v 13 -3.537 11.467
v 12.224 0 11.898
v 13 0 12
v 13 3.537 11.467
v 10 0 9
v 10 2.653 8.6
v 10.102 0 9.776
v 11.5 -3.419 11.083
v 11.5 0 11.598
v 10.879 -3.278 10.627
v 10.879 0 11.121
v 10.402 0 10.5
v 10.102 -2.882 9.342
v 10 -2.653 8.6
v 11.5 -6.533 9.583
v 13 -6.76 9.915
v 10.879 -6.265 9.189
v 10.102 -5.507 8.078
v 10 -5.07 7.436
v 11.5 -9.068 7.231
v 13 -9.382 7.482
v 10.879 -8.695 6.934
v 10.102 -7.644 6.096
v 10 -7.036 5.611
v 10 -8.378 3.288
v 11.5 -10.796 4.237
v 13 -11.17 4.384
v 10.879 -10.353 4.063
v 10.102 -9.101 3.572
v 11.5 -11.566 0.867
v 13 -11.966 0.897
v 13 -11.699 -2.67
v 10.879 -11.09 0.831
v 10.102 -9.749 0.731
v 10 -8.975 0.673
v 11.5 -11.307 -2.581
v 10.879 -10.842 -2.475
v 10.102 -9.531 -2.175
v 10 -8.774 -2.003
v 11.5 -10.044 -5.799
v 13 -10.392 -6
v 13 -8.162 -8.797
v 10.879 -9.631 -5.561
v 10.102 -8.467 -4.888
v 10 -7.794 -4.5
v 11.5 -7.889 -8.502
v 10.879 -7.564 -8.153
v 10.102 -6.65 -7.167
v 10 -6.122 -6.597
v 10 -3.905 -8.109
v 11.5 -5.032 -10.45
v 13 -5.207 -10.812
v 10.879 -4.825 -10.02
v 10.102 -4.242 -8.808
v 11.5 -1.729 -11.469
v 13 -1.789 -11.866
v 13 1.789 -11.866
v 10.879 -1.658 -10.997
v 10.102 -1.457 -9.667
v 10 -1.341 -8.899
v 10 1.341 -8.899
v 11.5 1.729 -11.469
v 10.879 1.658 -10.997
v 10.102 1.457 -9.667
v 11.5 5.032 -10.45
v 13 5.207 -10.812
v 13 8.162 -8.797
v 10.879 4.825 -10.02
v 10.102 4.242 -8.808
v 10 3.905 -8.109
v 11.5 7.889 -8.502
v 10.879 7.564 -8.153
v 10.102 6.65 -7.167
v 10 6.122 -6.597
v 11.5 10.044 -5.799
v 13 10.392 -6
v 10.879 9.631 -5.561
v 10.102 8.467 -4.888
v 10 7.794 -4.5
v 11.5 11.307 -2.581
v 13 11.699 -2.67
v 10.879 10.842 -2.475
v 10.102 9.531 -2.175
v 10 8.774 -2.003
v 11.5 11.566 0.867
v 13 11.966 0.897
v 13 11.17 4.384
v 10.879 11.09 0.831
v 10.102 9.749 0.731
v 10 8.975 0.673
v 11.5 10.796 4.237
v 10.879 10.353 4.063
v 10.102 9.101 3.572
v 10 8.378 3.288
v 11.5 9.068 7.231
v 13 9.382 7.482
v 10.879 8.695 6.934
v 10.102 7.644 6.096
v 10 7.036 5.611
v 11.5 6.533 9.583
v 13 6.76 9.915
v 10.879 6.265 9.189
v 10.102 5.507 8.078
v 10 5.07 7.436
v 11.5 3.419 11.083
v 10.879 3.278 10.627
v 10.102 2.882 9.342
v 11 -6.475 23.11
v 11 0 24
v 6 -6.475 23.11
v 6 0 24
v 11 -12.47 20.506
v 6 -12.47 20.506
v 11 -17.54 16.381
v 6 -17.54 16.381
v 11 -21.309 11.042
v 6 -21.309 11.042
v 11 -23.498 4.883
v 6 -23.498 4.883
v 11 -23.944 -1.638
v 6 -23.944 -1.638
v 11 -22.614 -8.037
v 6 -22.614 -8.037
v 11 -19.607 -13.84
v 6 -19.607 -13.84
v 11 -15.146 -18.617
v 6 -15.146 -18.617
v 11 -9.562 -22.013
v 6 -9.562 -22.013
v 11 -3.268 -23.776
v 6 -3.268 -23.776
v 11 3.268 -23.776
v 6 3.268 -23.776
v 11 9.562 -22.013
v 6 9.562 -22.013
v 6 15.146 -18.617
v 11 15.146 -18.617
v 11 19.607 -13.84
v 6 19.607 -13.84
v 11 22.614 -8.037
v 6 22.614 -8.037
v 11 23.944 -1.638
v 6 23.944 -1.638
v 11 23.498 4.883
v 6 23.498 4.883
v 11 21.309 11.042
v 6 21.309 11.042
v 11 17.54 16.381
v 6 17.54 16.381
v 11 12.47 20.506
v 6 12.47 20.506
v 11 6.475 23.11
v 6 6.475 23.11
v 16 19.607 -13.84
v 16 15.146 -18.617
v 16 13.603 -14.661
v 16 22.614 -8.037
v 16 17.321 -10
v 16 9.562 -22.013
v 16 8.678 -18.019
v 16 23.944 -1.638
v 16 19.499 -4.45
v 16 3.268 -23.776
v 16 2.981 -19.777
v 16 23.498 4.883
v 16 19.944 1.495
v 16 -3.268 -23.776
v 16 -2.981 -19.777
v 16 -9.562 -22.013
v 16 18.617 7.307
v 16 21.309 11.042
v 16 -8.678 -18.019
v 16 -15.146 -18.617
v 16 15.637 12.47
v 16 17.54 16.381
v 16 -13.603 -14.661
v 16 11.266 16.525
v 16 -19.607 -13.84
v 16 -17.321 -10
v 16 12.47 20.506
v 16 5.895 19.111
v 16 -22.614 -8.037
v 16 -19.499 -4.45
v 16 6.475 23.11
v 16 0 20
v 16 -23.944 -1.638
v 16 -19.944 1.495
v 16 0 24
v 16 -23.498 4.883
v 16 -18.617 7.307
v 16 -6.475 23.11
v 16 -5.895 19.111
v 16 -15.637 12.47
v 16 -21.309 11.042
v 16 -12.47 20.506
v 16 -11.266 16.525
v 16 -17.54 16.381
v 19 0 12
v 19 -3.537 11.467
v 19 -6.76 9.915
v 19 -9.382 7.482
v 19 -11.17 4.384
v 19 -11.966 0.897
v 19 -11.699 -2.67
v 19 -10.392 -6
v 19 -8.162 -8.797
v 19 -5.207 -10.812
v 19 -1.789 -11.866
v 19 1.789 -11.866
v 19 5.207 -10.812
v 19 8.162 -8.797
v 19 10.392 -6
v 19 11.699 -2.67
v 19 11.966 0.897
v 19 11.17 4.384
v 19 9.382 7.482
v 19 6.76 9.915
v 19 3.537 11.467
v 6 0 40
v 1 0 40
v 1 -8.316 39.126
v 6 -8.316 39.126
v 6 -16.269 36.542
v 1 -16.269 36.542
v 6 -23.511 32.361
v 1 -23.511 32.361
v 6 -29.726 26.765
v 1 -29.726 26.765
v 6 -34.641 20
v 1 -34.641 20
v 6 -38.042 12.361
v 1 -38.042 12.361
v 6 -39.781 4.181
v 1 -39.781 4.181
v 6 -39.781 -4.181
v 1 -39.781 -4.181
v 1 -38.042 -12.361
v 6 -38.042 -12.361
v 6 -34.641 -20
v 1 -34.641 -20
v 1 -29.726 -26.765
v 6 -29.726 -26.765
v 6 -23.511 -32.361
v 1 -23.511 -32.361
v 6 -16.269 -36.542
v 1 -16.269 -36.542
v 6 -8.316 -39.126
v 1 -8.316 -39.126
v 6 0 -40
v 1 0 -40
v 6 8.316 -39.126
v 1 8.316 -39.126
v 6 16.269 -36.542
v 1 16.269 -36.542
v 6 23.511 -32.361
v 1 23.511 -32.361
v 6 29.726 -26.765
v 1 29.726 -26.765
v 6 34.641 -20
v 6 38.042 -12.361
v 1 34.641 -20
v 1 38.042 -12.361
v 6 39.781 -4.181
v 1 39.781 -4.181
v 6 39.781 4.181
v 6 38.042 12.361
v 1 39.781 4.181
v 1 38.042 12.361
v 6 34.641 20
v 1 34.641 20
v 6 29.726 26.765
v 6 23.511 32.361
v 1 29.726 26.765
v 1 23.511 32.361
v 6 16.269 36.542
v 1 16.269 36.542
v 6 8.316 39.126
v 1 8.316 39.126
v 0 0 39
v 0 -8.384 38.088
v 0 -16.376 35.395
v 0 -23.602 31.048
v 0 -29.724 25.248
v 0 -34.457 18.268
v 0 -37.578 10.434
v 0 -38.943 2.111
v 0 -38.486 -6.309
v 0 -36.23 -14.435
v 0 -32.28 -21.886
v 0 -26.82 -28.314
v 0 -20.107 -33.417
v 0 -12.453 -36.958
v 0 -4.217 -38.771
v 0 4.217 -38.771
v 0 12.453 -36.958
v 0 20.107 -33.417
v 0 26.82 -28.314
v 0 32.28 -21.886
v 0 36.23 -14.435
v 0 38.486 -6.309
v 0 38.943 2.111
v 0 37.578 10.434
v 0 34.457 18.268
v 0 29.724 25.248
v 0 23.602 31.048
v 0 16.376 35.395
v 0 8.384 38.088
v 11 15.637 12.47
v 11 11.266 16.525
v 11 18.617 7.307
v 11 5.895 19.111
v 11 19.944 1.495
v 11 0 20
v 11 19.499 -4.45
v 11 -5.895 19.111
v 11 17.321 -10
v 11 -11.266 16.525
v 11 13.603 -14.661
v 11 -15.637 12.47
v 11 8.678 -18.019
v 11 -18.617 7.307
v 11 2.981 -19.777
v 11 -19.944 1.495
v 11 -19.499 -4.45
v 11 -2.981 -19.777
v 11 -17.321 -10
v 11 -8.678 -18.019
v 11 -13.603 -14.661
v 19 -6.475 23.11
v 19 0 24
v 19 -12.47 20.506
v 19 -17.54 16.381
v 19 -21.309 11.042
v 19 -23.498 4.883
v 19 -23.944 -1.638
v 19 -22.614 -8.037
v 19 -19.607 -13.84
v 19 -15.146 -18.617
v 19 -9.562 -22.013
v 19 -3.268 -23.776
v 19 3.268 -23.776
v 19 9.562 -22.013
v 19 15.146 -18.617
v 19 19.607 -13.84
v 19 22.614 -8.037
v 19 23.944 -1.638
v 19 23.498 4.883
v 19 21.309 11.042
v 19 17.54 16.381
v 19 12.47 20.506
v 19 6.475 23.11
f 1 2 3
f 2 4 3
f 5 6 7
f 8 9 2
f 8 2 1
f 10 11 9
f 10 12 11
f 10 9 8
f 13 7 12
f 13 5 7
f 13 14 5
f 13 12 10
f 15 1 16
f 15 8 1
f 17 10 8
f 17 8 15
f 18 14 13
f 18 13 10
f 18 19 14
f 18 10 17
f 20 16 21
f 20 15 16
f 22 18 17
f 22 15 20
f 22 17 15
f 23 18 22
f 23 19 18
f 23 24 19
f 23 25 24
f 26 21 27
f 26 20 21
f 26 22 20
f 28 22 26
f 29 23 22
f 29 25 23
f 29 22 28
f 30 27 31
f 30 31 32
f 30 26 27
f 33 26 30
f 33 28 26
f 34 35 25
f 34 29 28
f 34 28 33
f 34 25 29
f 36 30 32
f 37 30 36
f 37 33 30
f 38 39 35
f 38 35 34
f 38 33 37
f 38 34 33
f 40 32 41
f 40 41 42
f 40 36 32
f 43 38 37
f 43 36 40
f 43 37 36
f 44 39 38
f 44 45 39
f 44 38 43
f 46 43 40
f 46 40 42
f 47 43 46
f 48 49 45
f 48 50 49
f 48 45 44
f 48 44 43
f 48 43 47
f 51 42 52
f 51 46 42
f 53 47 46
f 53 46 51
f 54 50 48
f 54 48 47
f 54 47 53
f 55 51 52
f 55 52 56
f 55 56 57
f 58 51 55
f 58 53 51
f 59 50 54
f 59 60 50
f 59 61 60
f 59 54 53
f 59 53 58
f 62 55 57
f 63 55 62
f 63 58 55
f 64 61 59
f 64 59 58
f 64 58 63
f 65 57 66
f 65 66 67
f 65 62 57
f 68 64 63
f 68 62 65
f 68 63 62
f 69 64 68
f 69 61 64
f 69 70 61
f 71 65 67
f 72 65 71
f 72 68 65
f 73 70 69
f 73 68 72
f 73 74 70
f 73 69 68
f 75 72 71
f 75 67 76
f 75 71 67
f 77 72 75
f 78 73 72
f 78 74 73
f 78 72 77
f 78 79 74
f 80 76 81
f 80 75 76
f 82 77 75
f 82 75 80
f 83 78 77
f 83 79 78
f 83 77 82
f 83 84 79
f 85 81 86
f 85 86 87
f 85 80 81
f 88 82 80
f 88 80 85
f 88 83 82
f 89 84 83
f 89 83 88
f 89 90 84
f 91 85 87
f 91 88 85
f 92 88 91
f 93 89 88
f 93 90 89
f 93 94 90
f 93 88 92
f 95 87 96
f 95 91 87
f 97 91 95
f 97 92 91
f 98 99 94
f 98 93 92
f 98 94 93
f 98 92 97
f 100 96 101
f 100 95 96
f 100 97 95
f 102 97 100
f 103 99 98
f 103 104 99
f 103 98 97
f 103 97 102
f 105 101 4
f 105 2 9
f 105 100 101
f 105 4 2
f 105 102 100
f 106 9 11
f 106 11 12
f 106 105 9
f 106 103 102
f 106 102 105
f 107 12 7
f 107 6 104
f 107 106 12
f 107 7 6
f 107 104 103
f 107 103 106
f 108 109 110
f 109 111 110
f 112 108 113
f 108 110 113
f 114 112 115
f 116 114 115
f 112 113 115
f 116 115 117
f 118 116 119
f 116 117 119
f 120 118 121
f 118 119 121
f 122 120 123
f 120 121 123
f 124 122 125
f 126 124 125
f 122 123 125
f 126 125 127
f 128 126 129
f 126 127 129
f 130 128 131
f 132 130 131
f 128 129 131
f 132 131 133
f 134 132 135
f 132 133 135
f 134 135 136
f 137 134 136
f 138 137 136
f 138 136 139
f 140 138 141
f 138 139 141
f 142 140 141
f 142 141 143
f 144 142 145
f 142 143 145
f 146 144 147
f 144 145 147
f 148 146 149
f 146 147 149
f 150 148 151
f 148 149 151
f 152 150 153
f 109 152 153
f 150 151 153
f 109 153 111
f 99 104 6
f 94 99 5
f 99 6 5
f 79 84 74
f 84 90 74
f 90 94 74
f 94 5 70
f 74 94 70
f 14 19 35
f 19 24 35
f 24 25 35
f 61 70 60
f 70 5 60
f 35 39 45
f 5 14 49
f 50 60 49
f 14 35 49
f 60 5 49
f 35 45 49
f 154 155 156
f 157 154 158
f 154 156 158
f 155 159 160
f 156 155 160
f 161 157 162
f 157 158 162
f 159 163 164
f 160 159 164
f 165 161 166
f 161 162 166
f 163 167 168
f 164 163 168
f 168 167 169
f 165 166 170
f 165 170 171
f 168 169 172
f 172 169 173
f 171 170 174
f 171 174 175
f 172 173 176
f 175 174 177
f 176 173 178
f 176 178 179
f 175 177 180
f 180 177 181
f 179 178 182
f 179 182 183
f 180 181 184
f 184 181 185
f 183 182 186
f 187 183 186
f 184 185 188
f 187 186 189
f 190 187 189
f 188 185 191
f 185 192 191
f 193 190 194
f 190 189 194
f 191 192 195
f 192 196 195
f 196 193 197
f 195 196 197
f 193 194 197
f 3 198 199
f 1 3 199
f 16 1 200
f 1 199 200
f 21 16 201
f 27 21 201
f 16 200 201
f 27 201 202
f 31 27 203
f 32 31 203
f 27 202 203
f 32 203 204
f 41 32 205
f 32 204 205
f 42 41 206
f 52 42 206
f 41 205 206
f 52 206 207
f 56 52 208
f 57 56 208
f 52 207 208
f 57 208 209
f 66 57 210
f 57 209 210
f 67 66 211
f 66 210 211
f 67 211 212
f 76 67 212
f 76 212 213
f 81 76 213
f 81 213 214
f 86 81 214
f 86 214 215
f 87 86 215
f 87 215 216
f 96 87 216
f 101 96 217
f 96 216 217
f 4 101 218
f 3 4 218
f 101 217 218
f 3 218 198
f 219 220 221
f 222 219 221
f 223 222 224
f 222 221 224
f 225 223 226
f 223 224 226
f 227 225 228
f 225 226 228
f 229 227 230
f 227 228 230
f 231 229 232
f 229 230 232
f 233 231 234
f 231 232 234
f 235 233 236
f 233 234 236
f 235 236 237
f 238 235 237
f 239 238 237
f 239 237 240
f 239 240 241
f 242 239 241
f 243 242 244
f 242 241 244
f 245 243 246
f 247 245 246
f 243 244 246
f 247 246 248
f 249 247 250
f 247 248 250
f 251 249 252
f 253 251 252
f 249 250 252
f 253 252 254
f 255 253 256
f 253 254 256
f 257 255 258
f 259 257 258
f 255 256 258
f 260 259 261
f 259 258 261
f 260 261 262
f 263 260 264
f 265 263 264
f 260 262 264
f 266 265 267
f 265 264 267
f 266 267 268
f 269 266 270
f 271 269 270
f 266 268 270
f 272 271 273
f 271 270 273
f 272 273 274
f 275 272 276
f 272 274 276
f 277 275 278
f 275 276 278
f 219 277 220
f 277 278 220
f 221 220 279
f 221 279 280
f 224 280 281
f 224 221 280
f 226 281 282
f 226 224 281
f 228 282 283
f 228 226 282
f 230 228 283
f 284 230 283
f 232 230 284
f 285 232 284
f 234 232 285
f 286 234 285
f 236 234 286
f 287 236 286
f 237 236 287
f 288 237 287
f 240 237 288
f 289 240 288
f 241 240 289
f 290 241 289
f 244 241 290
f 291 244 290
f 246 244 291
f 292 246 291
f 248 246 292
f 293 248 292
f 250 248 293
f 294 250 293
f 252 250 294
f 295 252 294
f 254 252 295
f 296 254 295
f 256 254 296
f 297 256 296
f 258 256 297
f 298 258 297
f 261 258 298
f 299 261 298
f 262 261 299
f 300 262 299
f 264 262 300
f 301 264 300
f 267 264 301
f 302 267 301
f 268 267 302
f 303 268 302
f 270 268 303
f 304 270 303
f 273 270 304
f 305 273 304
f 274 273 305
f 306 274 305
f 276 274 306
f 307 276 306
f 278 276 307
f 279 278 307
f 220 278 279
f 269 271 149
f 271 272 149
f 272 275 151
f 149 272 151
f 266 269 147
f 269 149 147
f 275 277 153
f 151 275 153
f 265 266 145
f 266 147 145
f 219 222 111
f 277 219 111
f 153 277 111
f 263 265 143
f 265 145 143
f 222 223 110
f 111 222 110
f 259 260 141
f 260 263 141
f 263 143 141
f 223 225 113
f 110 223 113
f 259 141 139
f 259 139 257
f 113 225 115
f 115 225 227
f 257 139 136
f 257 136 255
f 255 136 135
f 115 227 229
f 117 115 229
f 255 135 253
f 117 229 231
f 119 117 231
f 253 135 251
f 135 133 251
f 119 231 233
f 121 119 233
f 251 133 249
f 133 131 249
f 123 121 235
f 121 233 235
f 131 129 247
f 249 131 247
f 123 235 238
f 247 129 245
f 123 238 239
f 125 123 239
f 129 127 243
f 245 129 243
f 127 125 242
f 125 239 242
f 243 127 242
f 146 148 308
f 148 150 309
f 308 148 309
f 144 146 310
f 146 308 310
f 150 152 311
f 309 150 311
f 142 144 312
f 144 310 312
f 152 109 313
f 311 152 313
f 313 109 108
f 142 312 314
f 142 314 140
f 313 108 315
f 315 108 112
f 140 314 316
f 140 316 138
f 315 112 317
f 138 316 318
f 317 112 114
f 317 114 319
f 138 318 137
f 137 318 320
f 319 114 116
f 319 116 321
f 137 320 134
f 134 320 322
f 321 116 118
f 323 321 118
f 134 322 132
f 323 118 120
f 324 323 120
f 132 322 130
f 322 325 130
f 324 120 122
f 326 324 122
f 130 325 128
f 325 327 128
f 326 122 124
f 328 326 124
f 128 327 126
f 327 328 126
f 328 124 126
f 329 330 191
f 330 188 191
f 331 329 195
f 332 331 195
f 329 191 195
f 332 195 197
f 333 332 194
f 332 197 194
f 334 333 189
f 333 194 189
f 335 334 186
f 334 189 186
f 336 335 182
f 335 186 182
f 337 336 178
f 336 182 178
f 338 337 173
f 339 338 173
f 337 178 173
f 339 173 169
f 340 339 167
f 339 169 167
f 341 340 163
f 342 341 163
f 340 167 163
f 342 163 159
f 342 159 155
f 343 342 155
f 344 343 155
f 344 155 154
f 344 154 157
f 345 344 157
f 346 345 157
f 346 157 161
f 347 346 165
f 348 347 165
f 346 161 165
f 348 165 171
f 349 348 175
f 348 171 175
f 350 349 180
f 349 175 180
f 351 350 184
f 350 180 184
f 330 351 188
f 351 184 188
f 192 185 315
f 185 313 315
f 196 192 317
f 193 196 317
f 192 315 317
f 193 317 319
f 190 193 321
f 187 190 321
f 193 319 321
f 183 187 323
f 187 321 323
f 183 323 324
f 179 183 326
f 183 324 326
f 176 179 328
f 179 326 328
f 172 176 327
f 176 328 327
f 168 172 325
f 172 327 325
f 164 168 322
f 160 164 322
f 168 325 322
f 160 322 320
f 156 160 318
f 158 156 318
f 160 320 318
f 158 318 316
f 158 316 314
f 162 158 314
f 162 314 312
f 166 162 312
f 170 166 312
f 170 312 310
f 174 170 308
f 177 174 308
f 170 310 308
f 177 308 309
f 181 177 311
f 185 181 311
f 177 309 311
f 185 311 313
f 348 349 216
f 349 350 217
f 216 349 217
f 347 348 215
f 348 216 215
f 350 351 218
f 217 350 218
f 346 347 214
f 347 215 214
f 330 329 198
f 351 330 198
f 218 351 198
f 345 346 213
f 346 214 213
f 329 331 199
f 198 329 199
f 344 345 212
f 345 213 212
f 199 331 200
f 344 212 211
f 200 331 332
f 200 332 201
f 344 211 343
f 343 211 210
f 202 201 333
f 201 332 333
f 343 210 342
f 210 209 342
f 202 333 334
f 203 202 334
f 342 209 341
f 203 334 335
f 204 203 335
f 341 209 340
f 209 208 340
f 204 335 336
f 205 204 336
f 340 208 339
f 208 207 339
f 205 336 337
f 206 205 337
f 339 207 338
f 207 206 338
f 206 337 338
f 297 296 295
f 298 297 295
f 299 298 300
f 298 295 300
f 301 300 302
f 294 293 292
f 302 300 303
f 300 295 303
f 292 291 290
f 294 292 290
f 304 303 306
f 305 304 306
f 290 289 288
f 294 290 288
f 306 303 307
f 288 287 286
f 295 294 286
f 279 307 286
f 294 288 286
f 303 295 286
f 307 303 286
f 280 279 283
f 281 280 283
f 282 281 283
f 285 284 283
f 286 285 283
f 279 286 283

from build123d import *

# Parameters (mm, degrees)
F2_SIZE = 1
F3_R    = 3


with BuildPart() as f1:
    # F0 (on Front) → F1 (revolve)
    with BuildSketch(Plane.XZ):
        Polygon((0, 40), (0, 0), (10, 0), (10, 12), (19, 12), (19, 24), (16, 24), (16, 20), (11, 20), (11, 24), (6, 24), (6, 40), align=None)
    revolve(axis=Axis((9.5, 0, 0), (1, 0, 0)))

    # F2
    f2_edges = [f1.edges().sort_by_distance(p)[0] for p in [
        (0, 0, -40),
    ]]
    chamfer(f2_edges, length=F2_SIZE)

    # F3
    f3_edges = [f1.edges().sort_by_distance(p)[0] for p in [
        (10, 0, -12),
    ]]
    fillet(f3_edges, radius=F3_R)


solid = f1.part
